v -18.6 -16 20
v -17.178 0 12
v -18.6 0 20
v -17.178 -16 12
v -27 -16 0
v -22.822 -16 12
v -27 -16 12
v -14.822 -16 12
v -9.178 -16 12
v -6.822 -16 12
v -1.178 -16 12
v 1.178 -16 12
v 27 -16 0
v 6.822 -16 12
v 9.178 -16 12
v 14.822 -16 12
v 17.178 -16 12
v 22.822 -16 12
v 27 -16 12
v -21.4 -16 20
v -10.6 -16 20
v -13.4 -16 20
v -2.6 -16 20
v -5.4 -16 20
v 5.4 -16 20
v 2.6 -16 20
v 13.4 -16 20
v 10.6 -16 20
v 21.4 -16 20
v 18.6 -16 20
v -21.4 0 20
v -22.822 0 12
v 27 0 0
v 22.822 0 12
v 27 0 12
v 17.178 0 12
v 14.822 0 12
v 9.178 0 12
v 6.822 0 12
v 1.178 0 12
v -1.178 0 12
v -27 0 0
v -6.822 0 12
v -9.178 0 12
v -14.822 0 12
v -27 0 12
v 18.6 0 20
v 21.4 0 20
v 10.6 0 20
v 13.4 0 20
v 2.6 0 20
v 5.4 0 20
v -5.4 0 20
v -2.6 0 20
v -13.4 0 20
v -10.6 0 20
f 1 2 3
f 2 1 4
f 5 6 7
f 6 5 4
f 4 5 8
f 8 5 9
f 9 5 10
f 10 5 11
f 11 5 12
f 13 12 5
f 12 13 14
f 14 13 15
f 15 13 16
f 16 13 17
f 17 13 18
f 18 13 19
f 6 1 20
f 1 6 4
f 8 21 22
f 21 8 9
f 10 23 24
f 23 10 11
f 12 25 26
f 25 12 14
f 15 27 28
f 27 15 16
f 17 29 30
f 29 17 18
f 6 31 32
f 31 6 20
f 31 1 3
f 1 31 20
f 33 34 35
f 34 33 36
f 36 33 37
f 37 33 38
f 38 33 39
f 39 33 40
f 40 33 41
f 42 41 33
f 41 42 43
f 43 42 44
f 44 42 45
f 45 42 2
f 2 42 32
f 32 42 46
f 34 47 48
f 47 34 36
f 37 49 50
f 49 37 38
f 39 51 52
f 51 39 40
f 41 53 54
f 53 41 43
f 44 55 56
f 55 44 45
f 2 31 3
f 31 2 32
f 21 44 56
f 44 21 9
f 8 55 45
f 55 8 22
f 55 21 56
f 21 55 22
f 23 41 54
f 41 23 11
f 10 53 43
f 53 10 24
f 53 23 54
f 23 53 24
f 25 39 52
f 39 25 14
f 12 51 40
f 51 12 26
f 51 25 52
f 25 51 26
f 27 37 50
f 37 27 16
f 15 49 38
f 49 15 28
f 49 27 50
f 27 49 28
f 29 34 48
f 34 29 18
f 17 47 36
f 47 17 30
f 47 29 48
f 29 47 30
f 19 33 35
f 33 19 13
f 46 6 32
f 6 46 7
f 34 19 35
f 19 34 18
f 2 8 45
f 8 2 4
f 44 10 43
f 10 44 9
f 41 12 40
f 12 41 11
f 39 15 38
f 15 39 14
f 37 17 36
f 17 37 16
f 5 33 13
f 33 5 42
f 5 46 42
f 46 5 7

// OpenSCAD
$fn = 32;

// ----------------------------------------------------------------------
// Toothed rack, 6 teeth
// 8 mm pitch, 8 mm teeth
// ----------------------------------------------------------------------

// --- parameters (mm) ---
bar_w = 16;     // bar width (Y)
bar_h = 12;     // bar height (Z)
teeth = 6;      // number of teeth
pitch = 8;      // tooth pitch
tooth_h = 8;    // tooth height above the bar
root_w = 6;     // tooth width at the root
crest_w = 2.8;  // tooth width at the crest

// --- derived feature positions (mm) ---
span = (teeth - 1) * pitch;  // = 40   distance between the outer teeth
bar_l = span + root_w + 8;   // = 54   bar length: teeth plus 4 mm at each end
tooth_x = -span / 2;         // = -20   X of the first tooth
height = bar_h + tooth_h;    // = 20   overall height
feature_centers = [
  [tooth_x + 0 * pitch, -bar_w / 2],
  [tooth_x + 1 * pitch, -bar_w / 2],
  [tooth_x + 2 * pitch, -bar_w / 2],
  [tooth_x + 3 * pitch, -bar_w / 2],
  [tooth_x + 4 * pitch, -bar_w / 2],
  [tooth_x + 5 * pitch, -bar_w / 2]
];   // tooth centre line, drives the tooth loop

// bar with a rack of teeth, one extruded trapezoium per centre
module rack_tooth() {
  linear_extrude(height = bar_w)
    polygon(points = [
      [0, 0],
      [root_w, 0],
      [root_w / 2 + crest_w / 2, tooth_h + 1],
      [root_w / 2 - crest_w / 2, tooth_h + 1]
    ]);
}

union() {
  translate([-bar_l / 2, -bar_w, 0]) cube([bar_l, bar_w, bar_h]);
  for (centre = feature_centers)
    translate([centre[0] - root_w / 2, 0, bar_h - 1]) rotate([90, 0, 0]) rack_tooth();
}
